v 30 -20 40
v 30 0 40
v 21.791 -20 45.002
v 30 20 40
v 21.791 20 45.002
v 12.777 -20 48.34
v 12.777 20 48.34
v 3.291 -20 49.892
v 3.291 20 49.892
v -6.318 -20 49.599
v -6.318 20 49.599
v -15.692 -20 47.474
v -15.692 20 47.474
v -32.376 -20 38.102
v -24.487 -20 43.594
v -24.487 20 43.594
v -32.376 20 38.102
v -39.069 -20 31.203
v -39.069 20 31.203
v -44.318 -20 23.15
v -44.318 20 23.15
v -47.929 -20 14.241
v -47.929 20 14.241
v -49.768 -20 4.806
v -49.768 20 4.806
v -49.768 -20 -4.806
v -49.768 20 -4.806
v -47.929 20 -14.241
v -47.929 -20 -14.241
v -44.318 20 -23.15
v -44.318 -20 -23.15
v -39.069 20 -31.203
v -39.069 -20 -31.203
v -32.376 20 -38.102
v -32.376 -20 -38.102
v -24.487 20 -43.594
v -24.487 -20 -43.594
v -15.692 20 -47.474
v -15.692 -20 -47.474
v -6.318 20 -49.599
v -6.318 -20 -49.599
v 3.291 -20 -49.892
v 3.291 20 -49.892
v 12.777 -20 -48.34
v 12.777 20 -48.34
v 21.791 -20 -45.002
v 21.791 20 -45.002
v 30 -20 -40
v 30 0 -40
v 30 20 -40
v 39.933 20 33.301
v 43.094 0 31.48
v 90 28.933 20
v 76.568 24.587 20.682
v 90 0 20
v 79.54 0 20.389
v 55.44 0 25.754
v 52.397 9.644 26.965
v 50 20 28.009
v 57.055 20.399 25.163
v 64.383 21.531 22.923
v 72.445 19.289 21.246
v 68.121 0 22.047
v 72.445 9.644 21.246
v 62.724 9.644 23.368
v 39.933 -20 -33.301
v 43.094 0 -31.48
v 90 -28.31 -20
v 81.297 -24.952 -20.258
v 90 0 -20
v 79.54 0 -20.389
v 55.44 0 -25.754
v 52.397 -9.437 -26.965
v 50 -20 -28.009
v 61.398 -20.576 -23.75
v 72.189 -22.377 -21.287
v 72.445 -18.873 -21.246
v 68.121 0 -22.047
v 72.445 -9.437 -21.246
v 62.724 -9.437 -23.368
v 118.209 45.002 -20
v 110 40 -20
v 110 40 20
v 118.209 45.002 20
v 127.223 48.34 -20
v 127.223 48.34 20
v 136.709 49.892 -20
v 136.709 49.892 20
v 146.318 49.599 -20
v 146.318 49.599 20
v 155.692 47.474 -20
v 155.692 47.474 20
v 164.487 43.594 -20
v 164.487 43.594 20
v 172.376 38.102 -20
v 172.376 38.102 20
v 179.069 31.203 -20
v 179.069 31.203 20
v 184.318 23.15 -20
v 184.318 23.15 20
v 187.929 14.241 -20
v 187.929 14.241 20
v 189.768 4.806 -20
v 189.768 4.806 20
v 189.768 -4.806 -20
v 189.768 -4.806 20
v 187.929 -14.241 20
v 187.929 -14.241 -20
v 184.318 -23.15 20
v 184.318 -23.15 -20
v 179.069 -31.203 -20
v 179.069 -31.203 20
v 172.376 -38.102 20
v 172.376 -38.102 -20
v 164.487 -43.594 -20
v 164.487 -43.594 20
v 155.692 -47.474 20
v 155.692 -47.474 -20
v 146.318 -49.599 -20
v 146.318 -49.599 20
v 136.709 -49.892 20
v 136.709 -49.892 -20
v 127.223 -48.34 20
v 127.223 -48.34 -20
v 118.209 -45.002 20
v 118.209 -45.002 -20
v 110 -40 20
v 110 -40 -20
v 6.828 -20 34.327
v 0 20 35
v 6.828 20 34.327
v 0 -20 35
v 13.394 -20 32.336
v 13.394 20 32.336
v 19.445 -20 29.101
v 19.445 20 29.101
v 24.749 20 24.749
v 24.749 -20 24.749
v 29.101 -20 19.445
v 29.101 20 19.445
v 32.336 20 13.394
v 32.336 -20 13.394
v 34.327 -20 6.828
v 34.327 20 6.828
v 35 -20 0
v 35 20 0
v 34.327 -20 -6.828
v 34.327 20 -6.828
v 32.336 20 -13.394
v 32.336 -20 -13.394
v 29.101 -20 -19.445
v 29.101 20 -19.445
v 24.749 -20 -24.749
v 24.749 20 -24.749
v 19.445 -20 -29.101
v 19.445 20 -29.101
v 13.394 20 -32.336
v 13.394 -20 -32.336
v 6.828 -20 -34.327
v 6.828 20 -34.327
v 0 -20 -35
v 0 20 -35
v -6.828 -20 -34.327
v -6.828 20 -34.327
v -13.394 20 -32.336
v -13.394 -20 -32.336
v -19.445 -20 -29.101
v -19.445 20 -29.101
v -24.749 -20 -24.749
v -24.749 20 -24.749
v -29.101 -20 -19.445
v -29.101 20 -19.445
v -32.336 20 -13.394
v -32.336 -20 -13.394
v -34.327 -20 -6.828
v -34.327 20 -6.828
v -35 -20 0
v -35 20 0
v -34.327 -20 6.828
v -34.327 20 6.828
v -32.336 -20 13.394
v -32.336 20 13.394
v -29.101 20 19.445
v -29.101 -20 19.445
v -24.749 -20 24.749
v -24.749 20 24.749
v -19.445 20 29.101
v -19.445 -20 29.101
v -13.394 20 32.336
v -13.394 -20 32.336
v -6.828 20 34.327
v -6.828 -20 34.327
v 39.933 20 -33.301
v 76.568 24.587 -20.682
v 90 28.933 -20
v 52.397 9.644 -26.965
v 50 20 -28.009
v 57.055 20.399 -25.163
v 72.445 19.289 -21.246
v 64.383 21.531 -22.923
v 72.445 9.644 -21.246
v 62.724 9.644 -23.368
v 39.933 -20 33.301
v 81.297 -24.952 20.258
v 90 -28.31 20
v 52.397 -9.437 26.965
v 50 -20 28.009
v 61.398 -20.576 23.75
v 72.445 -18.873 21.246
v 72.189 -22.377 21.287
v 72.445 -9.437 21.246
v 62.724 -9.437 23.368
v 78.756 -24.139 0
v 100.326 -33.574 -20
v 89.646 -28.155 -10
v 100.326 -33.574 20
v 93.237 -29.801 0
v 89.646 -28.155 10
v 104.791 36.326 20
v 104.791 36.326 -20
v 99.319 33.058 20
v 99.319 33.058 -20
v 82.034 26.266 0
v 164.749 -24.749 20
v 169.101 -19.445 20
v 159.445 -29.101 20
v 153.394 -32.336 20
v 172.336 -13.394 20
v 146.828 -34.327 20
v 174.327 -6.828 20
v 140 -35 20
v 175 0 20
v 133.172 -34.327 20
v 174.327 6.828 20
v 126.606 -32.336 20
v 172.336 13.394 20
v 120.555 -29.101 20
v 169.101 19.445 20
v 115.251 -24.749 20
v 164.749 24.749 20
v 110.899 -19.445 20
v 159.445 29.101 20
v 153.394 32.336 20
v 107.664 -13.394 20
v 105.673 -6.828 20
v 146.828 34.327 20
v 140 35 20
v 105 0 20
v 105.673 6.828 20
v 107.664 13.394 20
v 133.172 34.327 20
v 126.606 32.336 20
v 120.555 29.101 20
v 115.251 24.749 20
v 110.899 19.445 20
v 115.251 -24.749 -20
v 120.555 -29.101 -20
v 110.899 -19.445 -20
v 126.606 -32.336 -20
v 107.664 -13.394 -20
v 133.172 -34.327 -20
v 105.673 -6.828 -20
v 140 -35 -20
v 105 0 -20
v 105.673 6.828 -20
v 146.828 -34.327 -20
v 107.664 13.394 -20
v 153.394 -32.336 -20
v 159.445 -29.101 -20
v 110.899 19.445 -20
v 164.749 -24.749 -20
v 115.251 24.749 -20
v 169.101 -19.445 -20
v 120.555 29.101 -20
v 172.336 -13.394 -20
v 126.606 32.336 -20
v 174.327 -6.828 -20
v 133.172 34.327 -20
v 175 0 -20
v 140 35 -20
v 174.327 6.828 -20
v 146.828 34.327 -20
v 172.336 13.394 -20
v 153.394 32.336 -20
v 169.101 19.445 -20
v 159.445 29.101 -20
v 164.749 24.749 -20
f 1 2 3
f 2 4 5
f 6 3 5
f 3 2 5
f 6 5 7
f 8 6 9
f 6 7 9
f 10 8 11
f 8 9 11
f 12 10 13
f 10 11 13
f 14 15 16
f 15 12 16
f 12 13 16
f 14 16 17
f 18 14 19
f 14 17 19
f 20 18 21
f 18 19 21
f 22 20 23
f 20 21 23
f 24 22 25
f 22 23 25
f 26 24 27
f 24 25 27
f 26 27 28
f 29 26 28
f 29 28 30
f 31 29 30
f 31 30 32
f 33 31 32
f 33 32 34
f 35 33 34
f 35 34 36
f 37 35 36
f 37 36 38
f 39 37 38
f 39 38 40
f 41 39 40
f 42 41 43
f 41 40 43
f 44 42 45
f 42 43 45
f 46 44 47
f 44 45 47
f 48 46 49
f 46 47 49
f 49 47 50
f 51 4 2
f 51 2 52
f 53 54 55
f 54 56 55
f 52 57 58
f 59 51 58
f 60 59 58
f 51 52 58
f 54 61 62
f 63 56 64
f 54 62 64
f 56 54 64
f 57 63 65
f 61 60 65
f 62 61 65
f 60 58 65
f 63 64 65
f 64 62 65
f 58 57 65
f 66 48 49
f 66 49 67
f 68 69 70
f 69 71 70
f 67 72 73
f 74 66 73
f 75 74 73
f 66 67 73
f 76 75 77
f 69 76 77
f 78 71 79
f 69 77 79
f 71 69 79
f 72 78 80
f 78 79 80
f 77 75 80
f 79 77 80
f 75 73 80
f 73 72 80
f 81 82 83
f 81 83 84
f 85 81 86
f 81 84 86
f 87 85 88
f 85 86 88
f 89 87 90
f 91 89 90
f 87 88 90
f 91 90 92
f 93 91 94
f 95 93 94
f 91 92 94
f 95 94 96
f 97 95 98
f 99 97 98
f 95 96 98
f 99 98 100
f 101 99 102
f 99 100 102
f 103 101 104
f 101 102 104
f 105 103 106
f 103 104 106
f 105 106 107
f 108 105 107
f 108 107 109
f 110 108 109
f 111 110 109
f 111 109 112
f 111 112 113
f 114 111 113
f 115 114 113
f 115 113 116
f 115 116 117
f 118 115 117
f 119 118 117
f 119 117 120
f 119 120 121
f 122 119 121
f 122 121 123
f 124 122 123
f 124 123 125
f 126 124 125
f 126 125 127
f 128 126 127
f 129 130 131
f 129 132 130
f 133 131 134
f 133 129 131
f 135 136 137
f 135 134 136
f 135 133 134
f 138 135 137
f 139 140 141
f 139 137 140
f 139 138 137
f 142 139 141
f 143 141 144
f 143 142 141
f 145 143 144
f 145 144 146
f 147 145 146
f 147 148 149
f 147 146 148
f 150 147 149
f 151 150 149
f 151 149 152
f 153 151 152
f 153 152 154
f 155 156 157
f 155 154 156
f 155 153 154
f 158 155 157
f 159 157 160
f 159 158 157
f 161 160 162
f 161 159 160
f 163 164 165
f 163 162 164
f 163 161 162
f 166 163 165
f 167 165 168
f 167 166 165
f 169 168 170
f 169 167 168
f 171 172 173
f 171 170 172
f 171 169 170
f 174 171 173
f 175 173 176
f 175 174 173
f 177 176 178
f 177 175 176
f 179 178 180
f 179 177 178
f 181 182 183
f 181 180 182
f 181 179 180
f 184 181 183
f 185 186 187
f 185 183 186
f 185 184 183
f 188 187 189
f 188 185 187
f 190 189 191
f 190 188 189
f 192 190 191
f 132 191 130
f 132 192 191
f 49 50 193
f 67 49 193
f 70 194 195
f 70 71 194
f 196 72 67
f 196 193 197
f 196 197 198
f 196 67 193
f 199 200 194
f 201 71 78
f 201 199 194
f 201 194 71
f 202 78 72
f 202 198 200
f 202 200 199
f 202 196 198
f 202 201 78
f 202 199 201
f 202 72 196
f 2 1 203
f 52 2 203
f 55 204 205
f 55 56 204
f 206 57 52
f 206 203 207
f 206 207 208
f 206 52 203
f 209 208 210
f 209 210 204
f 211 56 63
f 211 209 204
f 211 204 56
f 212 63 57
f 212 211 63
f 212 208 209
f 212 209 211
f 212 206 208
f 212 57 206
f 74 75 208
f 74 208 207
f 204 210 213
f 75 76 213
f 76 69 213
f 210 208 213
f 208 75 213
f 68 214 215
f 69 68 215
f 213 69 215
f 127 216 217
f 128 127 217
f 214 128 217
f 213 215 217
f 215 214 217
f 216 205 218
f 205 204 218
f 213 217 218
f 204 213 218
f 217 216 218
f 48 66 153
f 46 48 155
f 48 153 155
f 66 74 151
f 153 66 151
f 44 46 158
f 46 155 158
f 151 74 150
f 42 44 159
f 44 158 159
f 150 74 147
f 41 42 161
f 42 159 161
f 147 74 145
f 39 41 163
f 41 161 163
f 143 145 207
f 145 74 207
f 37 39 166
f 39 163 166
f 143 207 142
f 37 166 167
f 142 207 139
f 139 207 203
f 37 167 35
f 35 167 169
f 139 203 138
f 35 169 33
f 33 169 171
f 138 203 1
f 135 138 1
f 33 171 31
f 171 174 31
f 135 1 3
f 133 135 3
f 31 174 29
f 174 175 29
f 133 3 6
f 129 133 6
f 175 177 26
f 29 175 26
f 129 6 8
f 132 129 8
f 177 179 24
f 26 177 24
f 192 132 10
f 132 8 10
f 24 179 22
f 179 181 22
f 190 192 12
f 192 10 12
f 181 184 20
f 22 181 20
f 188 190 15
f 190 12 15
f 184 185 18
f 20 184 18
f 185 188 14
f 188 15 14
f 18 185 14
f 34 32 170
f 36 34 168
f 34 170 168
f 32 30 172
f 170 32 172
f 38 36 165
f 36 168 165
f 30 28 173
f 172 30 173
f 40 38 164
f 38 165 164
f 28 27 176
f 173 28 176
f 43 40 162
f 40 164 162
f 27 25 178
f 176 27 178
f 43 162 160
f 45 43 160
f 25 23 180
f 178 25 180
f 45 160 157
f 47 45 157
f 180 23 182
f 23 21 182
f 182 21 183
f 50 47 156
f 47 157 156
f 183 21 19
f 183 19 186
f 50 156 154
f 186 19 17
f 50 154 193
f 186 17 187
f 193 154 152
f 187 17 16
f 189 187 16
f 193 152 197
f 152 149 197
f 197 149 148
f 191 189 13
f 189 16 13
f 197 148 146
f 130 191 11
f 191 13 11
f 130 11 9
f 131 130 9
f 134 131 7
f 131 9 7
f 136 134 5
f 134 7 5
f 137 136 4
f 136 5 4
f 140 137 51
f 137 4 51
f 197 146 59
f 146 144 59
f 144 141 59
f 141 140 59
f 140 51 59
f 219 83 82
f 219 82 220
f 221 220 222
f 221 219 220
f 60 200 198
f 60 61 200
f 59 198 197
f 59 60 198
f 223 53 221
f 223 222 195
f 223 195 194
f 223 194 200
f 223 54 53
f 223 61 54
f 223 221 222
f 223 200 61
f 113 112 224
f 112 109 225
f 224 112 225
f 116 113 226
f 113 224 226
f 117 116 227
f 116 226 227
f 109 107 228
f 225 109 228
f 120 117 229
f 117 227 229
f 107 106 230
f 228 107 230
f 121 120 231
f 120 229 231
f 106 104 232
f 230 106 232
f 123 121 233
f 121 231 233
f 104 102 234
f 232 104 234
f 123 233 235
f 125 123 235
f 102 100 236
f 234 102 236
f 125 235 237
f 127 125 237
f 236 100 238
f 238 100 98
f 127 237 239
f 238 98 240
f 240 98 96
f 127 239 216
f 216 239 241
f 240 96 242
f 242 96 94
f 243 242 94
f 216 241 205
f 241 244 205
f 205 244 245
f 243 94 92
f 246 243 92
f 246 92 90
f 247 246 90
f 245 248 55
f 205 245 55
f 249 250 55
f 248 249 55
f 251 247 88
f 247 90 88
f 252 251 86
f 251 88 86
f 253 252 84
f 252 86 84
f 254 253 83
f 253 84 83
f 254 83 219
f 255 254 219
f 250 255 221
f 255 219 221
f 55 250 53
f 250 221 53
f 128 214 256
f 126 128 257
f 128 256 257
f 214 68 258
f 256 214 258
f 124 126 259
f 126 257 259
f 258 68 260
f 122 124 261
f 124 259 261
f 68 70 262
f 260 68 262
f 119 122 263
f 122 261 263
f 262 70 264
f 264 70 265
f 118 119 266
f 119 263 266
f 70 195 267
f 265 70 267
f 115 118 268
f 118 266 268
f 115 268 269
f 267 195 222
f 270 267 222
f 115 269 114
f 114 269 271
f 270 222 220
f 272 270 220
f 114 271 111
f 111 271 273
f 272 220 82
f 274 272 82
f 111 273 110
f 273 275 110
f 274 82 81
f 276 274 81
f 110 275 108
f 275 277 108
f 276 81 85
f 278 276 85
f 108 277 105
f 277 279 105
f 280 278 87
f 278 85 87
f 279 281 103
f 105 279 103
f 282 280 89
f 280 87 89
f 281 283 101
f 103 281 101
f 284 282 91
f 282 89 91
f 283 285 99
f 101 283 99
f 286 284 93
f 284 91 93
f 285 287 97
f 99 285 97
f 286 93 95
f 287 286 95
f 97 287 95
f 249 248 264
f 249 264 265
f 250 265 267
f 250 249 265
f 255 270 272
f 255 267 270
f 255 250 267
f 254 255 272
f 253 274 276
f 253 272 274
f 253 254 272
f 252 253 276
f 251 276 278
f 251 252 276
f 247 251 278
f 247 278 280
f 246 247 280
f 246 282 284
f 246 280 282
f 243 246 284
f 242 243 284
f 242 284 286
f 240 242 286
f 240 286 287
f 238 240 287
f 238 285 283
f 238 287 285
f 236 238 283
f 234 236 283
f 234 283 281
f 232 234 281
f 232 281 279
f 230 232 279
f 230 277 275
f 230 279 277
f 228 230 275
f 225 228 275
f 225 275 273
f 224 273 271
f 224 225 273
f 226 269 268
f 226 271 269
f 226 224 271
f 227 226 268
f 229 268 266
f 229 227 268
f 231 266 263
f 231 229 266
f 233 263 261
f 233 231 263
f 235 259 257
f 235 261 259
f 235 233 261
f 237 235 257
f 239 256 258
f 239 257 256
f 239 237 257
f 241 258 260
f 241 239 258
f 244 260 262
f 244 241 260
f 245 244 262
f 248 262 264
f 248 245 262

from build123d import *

# Parameters (mm, degrees)
SKETCH1_R               = 35
BOSS_EXTRUDE1_DEPTH     = 60
CUT_EXTRUDE2_DEPTH      = 212.187120971
CUT_EXTRUDE2_DEPTH_BACK = 212.187120971
SKETCH3_OUTSIDE_W       = 299.272
SKETCH3_OUTSIDE_H       = 179.272
SKETCH3_OUTSIDE_R       = 35


with BuildPart() as part:
    # Sketch1 → Boss-Extrude1 (new, symmetric)
    with BuildSketch(Plane(origin=(0, 0, 0), x_dir=(1, 0, 0), z_dir=(0, 1, 0))):
        with BuildLine():
            Line((90, 20), (190, 20))
            Line((190, 20), (190, -20))
            Line((190, -20), (90, -20))
            add(Edge.make_bspline(
                [(30, -40), (53.522105639, -22.358420771), (73.740829121, -19.957299765), (90, -20)],
                knots=[0, 0, 0, 0, 0.5, 0.5, 0.5, 0.5], degree=3))
            ThreePointArc((30, -40), (-50, 0), (30, 40))
            add(Edge.make_bspline(
                [(30, 40), (53.522105639, 22.358420771), (73.740829121, 19.957299765), (90, 20)],
                knots=[0, 0, 0, 0, 0.5, 0.5, 0.5, 0.5], degree=3))
        make_face()
        with Locations(Location((0, 0, 0), (0, 0, 270))):
            Circle(SKETCH1_R, mode=Mode.SUBTRACT)
    extrude(amount=BOSS_EXTRUDE1_DEPTH, both=True)

    # Sketch3 outside → Cut-Extrude2 (cut, two sides: drawn at the far end of the back side and taken through both)
    # profile 1 of 2: a face of its own
    with BuildSketch(Plane(origin=(0, 0, -20), x_dir=(-1, 0, 0), z_dir=(0, 0, -1)).offset(-CUT_EXTRUDE2_DEPTH_BACK)):
        with Locations((-70, 0)):
            Rectangle(SKETCH3_OUTSIDE_W, SKETCH3_OUTSIDE_H)
        with BuildLine():
            Line((-50, -20), (50, -20))
            Line((50, -20), (50, 20))
            Line((50, 20), (-50, 20))
            add(Edge.make_bspline(
                [(-110, 40), (-99.496724582, 32.122543436), (-87.389560029, 27.685973517), (-61.506465559, 20), (-50, 20)],
                knots=[0, 0, 0, 0, 0.549428734, 1, 1, 1, 1], degree=3))
            ThreePointArc((-110, 40), (-190, 0), (-110, -40))
            add(Edge.make_bspline(
                [(-110, -40), (-100.093364528, -32.570023396), (-80.659161516, -23.139318123), (-60.932096988, -20), (-50, -20)],
                knots=[0, 0, 0, 0, 0.546701071, 1, 1, 1, 1], degree=3))
        make_face(mode=Mode.SUBTRACT)
    # profile 2 of 2: a face of its own
    with BuildSketch(Plane(origin=(0, 0, -20), x_dir=(-1, 0, 0), z_dir=(0, 0, -1)).offset(-CUT_EXTRUDE2_DEPTH_BACK)):
        with Locations((-140, 0)):
            Circle(SKETCH3_OUTSIDE_R)
    extrude(amount=CUT_EXTRUDE2_DEPTH + CUT_EXTRUDE2_DEPTH_BACK, mode=Mode.SUBTRACT)


solid = part.part
